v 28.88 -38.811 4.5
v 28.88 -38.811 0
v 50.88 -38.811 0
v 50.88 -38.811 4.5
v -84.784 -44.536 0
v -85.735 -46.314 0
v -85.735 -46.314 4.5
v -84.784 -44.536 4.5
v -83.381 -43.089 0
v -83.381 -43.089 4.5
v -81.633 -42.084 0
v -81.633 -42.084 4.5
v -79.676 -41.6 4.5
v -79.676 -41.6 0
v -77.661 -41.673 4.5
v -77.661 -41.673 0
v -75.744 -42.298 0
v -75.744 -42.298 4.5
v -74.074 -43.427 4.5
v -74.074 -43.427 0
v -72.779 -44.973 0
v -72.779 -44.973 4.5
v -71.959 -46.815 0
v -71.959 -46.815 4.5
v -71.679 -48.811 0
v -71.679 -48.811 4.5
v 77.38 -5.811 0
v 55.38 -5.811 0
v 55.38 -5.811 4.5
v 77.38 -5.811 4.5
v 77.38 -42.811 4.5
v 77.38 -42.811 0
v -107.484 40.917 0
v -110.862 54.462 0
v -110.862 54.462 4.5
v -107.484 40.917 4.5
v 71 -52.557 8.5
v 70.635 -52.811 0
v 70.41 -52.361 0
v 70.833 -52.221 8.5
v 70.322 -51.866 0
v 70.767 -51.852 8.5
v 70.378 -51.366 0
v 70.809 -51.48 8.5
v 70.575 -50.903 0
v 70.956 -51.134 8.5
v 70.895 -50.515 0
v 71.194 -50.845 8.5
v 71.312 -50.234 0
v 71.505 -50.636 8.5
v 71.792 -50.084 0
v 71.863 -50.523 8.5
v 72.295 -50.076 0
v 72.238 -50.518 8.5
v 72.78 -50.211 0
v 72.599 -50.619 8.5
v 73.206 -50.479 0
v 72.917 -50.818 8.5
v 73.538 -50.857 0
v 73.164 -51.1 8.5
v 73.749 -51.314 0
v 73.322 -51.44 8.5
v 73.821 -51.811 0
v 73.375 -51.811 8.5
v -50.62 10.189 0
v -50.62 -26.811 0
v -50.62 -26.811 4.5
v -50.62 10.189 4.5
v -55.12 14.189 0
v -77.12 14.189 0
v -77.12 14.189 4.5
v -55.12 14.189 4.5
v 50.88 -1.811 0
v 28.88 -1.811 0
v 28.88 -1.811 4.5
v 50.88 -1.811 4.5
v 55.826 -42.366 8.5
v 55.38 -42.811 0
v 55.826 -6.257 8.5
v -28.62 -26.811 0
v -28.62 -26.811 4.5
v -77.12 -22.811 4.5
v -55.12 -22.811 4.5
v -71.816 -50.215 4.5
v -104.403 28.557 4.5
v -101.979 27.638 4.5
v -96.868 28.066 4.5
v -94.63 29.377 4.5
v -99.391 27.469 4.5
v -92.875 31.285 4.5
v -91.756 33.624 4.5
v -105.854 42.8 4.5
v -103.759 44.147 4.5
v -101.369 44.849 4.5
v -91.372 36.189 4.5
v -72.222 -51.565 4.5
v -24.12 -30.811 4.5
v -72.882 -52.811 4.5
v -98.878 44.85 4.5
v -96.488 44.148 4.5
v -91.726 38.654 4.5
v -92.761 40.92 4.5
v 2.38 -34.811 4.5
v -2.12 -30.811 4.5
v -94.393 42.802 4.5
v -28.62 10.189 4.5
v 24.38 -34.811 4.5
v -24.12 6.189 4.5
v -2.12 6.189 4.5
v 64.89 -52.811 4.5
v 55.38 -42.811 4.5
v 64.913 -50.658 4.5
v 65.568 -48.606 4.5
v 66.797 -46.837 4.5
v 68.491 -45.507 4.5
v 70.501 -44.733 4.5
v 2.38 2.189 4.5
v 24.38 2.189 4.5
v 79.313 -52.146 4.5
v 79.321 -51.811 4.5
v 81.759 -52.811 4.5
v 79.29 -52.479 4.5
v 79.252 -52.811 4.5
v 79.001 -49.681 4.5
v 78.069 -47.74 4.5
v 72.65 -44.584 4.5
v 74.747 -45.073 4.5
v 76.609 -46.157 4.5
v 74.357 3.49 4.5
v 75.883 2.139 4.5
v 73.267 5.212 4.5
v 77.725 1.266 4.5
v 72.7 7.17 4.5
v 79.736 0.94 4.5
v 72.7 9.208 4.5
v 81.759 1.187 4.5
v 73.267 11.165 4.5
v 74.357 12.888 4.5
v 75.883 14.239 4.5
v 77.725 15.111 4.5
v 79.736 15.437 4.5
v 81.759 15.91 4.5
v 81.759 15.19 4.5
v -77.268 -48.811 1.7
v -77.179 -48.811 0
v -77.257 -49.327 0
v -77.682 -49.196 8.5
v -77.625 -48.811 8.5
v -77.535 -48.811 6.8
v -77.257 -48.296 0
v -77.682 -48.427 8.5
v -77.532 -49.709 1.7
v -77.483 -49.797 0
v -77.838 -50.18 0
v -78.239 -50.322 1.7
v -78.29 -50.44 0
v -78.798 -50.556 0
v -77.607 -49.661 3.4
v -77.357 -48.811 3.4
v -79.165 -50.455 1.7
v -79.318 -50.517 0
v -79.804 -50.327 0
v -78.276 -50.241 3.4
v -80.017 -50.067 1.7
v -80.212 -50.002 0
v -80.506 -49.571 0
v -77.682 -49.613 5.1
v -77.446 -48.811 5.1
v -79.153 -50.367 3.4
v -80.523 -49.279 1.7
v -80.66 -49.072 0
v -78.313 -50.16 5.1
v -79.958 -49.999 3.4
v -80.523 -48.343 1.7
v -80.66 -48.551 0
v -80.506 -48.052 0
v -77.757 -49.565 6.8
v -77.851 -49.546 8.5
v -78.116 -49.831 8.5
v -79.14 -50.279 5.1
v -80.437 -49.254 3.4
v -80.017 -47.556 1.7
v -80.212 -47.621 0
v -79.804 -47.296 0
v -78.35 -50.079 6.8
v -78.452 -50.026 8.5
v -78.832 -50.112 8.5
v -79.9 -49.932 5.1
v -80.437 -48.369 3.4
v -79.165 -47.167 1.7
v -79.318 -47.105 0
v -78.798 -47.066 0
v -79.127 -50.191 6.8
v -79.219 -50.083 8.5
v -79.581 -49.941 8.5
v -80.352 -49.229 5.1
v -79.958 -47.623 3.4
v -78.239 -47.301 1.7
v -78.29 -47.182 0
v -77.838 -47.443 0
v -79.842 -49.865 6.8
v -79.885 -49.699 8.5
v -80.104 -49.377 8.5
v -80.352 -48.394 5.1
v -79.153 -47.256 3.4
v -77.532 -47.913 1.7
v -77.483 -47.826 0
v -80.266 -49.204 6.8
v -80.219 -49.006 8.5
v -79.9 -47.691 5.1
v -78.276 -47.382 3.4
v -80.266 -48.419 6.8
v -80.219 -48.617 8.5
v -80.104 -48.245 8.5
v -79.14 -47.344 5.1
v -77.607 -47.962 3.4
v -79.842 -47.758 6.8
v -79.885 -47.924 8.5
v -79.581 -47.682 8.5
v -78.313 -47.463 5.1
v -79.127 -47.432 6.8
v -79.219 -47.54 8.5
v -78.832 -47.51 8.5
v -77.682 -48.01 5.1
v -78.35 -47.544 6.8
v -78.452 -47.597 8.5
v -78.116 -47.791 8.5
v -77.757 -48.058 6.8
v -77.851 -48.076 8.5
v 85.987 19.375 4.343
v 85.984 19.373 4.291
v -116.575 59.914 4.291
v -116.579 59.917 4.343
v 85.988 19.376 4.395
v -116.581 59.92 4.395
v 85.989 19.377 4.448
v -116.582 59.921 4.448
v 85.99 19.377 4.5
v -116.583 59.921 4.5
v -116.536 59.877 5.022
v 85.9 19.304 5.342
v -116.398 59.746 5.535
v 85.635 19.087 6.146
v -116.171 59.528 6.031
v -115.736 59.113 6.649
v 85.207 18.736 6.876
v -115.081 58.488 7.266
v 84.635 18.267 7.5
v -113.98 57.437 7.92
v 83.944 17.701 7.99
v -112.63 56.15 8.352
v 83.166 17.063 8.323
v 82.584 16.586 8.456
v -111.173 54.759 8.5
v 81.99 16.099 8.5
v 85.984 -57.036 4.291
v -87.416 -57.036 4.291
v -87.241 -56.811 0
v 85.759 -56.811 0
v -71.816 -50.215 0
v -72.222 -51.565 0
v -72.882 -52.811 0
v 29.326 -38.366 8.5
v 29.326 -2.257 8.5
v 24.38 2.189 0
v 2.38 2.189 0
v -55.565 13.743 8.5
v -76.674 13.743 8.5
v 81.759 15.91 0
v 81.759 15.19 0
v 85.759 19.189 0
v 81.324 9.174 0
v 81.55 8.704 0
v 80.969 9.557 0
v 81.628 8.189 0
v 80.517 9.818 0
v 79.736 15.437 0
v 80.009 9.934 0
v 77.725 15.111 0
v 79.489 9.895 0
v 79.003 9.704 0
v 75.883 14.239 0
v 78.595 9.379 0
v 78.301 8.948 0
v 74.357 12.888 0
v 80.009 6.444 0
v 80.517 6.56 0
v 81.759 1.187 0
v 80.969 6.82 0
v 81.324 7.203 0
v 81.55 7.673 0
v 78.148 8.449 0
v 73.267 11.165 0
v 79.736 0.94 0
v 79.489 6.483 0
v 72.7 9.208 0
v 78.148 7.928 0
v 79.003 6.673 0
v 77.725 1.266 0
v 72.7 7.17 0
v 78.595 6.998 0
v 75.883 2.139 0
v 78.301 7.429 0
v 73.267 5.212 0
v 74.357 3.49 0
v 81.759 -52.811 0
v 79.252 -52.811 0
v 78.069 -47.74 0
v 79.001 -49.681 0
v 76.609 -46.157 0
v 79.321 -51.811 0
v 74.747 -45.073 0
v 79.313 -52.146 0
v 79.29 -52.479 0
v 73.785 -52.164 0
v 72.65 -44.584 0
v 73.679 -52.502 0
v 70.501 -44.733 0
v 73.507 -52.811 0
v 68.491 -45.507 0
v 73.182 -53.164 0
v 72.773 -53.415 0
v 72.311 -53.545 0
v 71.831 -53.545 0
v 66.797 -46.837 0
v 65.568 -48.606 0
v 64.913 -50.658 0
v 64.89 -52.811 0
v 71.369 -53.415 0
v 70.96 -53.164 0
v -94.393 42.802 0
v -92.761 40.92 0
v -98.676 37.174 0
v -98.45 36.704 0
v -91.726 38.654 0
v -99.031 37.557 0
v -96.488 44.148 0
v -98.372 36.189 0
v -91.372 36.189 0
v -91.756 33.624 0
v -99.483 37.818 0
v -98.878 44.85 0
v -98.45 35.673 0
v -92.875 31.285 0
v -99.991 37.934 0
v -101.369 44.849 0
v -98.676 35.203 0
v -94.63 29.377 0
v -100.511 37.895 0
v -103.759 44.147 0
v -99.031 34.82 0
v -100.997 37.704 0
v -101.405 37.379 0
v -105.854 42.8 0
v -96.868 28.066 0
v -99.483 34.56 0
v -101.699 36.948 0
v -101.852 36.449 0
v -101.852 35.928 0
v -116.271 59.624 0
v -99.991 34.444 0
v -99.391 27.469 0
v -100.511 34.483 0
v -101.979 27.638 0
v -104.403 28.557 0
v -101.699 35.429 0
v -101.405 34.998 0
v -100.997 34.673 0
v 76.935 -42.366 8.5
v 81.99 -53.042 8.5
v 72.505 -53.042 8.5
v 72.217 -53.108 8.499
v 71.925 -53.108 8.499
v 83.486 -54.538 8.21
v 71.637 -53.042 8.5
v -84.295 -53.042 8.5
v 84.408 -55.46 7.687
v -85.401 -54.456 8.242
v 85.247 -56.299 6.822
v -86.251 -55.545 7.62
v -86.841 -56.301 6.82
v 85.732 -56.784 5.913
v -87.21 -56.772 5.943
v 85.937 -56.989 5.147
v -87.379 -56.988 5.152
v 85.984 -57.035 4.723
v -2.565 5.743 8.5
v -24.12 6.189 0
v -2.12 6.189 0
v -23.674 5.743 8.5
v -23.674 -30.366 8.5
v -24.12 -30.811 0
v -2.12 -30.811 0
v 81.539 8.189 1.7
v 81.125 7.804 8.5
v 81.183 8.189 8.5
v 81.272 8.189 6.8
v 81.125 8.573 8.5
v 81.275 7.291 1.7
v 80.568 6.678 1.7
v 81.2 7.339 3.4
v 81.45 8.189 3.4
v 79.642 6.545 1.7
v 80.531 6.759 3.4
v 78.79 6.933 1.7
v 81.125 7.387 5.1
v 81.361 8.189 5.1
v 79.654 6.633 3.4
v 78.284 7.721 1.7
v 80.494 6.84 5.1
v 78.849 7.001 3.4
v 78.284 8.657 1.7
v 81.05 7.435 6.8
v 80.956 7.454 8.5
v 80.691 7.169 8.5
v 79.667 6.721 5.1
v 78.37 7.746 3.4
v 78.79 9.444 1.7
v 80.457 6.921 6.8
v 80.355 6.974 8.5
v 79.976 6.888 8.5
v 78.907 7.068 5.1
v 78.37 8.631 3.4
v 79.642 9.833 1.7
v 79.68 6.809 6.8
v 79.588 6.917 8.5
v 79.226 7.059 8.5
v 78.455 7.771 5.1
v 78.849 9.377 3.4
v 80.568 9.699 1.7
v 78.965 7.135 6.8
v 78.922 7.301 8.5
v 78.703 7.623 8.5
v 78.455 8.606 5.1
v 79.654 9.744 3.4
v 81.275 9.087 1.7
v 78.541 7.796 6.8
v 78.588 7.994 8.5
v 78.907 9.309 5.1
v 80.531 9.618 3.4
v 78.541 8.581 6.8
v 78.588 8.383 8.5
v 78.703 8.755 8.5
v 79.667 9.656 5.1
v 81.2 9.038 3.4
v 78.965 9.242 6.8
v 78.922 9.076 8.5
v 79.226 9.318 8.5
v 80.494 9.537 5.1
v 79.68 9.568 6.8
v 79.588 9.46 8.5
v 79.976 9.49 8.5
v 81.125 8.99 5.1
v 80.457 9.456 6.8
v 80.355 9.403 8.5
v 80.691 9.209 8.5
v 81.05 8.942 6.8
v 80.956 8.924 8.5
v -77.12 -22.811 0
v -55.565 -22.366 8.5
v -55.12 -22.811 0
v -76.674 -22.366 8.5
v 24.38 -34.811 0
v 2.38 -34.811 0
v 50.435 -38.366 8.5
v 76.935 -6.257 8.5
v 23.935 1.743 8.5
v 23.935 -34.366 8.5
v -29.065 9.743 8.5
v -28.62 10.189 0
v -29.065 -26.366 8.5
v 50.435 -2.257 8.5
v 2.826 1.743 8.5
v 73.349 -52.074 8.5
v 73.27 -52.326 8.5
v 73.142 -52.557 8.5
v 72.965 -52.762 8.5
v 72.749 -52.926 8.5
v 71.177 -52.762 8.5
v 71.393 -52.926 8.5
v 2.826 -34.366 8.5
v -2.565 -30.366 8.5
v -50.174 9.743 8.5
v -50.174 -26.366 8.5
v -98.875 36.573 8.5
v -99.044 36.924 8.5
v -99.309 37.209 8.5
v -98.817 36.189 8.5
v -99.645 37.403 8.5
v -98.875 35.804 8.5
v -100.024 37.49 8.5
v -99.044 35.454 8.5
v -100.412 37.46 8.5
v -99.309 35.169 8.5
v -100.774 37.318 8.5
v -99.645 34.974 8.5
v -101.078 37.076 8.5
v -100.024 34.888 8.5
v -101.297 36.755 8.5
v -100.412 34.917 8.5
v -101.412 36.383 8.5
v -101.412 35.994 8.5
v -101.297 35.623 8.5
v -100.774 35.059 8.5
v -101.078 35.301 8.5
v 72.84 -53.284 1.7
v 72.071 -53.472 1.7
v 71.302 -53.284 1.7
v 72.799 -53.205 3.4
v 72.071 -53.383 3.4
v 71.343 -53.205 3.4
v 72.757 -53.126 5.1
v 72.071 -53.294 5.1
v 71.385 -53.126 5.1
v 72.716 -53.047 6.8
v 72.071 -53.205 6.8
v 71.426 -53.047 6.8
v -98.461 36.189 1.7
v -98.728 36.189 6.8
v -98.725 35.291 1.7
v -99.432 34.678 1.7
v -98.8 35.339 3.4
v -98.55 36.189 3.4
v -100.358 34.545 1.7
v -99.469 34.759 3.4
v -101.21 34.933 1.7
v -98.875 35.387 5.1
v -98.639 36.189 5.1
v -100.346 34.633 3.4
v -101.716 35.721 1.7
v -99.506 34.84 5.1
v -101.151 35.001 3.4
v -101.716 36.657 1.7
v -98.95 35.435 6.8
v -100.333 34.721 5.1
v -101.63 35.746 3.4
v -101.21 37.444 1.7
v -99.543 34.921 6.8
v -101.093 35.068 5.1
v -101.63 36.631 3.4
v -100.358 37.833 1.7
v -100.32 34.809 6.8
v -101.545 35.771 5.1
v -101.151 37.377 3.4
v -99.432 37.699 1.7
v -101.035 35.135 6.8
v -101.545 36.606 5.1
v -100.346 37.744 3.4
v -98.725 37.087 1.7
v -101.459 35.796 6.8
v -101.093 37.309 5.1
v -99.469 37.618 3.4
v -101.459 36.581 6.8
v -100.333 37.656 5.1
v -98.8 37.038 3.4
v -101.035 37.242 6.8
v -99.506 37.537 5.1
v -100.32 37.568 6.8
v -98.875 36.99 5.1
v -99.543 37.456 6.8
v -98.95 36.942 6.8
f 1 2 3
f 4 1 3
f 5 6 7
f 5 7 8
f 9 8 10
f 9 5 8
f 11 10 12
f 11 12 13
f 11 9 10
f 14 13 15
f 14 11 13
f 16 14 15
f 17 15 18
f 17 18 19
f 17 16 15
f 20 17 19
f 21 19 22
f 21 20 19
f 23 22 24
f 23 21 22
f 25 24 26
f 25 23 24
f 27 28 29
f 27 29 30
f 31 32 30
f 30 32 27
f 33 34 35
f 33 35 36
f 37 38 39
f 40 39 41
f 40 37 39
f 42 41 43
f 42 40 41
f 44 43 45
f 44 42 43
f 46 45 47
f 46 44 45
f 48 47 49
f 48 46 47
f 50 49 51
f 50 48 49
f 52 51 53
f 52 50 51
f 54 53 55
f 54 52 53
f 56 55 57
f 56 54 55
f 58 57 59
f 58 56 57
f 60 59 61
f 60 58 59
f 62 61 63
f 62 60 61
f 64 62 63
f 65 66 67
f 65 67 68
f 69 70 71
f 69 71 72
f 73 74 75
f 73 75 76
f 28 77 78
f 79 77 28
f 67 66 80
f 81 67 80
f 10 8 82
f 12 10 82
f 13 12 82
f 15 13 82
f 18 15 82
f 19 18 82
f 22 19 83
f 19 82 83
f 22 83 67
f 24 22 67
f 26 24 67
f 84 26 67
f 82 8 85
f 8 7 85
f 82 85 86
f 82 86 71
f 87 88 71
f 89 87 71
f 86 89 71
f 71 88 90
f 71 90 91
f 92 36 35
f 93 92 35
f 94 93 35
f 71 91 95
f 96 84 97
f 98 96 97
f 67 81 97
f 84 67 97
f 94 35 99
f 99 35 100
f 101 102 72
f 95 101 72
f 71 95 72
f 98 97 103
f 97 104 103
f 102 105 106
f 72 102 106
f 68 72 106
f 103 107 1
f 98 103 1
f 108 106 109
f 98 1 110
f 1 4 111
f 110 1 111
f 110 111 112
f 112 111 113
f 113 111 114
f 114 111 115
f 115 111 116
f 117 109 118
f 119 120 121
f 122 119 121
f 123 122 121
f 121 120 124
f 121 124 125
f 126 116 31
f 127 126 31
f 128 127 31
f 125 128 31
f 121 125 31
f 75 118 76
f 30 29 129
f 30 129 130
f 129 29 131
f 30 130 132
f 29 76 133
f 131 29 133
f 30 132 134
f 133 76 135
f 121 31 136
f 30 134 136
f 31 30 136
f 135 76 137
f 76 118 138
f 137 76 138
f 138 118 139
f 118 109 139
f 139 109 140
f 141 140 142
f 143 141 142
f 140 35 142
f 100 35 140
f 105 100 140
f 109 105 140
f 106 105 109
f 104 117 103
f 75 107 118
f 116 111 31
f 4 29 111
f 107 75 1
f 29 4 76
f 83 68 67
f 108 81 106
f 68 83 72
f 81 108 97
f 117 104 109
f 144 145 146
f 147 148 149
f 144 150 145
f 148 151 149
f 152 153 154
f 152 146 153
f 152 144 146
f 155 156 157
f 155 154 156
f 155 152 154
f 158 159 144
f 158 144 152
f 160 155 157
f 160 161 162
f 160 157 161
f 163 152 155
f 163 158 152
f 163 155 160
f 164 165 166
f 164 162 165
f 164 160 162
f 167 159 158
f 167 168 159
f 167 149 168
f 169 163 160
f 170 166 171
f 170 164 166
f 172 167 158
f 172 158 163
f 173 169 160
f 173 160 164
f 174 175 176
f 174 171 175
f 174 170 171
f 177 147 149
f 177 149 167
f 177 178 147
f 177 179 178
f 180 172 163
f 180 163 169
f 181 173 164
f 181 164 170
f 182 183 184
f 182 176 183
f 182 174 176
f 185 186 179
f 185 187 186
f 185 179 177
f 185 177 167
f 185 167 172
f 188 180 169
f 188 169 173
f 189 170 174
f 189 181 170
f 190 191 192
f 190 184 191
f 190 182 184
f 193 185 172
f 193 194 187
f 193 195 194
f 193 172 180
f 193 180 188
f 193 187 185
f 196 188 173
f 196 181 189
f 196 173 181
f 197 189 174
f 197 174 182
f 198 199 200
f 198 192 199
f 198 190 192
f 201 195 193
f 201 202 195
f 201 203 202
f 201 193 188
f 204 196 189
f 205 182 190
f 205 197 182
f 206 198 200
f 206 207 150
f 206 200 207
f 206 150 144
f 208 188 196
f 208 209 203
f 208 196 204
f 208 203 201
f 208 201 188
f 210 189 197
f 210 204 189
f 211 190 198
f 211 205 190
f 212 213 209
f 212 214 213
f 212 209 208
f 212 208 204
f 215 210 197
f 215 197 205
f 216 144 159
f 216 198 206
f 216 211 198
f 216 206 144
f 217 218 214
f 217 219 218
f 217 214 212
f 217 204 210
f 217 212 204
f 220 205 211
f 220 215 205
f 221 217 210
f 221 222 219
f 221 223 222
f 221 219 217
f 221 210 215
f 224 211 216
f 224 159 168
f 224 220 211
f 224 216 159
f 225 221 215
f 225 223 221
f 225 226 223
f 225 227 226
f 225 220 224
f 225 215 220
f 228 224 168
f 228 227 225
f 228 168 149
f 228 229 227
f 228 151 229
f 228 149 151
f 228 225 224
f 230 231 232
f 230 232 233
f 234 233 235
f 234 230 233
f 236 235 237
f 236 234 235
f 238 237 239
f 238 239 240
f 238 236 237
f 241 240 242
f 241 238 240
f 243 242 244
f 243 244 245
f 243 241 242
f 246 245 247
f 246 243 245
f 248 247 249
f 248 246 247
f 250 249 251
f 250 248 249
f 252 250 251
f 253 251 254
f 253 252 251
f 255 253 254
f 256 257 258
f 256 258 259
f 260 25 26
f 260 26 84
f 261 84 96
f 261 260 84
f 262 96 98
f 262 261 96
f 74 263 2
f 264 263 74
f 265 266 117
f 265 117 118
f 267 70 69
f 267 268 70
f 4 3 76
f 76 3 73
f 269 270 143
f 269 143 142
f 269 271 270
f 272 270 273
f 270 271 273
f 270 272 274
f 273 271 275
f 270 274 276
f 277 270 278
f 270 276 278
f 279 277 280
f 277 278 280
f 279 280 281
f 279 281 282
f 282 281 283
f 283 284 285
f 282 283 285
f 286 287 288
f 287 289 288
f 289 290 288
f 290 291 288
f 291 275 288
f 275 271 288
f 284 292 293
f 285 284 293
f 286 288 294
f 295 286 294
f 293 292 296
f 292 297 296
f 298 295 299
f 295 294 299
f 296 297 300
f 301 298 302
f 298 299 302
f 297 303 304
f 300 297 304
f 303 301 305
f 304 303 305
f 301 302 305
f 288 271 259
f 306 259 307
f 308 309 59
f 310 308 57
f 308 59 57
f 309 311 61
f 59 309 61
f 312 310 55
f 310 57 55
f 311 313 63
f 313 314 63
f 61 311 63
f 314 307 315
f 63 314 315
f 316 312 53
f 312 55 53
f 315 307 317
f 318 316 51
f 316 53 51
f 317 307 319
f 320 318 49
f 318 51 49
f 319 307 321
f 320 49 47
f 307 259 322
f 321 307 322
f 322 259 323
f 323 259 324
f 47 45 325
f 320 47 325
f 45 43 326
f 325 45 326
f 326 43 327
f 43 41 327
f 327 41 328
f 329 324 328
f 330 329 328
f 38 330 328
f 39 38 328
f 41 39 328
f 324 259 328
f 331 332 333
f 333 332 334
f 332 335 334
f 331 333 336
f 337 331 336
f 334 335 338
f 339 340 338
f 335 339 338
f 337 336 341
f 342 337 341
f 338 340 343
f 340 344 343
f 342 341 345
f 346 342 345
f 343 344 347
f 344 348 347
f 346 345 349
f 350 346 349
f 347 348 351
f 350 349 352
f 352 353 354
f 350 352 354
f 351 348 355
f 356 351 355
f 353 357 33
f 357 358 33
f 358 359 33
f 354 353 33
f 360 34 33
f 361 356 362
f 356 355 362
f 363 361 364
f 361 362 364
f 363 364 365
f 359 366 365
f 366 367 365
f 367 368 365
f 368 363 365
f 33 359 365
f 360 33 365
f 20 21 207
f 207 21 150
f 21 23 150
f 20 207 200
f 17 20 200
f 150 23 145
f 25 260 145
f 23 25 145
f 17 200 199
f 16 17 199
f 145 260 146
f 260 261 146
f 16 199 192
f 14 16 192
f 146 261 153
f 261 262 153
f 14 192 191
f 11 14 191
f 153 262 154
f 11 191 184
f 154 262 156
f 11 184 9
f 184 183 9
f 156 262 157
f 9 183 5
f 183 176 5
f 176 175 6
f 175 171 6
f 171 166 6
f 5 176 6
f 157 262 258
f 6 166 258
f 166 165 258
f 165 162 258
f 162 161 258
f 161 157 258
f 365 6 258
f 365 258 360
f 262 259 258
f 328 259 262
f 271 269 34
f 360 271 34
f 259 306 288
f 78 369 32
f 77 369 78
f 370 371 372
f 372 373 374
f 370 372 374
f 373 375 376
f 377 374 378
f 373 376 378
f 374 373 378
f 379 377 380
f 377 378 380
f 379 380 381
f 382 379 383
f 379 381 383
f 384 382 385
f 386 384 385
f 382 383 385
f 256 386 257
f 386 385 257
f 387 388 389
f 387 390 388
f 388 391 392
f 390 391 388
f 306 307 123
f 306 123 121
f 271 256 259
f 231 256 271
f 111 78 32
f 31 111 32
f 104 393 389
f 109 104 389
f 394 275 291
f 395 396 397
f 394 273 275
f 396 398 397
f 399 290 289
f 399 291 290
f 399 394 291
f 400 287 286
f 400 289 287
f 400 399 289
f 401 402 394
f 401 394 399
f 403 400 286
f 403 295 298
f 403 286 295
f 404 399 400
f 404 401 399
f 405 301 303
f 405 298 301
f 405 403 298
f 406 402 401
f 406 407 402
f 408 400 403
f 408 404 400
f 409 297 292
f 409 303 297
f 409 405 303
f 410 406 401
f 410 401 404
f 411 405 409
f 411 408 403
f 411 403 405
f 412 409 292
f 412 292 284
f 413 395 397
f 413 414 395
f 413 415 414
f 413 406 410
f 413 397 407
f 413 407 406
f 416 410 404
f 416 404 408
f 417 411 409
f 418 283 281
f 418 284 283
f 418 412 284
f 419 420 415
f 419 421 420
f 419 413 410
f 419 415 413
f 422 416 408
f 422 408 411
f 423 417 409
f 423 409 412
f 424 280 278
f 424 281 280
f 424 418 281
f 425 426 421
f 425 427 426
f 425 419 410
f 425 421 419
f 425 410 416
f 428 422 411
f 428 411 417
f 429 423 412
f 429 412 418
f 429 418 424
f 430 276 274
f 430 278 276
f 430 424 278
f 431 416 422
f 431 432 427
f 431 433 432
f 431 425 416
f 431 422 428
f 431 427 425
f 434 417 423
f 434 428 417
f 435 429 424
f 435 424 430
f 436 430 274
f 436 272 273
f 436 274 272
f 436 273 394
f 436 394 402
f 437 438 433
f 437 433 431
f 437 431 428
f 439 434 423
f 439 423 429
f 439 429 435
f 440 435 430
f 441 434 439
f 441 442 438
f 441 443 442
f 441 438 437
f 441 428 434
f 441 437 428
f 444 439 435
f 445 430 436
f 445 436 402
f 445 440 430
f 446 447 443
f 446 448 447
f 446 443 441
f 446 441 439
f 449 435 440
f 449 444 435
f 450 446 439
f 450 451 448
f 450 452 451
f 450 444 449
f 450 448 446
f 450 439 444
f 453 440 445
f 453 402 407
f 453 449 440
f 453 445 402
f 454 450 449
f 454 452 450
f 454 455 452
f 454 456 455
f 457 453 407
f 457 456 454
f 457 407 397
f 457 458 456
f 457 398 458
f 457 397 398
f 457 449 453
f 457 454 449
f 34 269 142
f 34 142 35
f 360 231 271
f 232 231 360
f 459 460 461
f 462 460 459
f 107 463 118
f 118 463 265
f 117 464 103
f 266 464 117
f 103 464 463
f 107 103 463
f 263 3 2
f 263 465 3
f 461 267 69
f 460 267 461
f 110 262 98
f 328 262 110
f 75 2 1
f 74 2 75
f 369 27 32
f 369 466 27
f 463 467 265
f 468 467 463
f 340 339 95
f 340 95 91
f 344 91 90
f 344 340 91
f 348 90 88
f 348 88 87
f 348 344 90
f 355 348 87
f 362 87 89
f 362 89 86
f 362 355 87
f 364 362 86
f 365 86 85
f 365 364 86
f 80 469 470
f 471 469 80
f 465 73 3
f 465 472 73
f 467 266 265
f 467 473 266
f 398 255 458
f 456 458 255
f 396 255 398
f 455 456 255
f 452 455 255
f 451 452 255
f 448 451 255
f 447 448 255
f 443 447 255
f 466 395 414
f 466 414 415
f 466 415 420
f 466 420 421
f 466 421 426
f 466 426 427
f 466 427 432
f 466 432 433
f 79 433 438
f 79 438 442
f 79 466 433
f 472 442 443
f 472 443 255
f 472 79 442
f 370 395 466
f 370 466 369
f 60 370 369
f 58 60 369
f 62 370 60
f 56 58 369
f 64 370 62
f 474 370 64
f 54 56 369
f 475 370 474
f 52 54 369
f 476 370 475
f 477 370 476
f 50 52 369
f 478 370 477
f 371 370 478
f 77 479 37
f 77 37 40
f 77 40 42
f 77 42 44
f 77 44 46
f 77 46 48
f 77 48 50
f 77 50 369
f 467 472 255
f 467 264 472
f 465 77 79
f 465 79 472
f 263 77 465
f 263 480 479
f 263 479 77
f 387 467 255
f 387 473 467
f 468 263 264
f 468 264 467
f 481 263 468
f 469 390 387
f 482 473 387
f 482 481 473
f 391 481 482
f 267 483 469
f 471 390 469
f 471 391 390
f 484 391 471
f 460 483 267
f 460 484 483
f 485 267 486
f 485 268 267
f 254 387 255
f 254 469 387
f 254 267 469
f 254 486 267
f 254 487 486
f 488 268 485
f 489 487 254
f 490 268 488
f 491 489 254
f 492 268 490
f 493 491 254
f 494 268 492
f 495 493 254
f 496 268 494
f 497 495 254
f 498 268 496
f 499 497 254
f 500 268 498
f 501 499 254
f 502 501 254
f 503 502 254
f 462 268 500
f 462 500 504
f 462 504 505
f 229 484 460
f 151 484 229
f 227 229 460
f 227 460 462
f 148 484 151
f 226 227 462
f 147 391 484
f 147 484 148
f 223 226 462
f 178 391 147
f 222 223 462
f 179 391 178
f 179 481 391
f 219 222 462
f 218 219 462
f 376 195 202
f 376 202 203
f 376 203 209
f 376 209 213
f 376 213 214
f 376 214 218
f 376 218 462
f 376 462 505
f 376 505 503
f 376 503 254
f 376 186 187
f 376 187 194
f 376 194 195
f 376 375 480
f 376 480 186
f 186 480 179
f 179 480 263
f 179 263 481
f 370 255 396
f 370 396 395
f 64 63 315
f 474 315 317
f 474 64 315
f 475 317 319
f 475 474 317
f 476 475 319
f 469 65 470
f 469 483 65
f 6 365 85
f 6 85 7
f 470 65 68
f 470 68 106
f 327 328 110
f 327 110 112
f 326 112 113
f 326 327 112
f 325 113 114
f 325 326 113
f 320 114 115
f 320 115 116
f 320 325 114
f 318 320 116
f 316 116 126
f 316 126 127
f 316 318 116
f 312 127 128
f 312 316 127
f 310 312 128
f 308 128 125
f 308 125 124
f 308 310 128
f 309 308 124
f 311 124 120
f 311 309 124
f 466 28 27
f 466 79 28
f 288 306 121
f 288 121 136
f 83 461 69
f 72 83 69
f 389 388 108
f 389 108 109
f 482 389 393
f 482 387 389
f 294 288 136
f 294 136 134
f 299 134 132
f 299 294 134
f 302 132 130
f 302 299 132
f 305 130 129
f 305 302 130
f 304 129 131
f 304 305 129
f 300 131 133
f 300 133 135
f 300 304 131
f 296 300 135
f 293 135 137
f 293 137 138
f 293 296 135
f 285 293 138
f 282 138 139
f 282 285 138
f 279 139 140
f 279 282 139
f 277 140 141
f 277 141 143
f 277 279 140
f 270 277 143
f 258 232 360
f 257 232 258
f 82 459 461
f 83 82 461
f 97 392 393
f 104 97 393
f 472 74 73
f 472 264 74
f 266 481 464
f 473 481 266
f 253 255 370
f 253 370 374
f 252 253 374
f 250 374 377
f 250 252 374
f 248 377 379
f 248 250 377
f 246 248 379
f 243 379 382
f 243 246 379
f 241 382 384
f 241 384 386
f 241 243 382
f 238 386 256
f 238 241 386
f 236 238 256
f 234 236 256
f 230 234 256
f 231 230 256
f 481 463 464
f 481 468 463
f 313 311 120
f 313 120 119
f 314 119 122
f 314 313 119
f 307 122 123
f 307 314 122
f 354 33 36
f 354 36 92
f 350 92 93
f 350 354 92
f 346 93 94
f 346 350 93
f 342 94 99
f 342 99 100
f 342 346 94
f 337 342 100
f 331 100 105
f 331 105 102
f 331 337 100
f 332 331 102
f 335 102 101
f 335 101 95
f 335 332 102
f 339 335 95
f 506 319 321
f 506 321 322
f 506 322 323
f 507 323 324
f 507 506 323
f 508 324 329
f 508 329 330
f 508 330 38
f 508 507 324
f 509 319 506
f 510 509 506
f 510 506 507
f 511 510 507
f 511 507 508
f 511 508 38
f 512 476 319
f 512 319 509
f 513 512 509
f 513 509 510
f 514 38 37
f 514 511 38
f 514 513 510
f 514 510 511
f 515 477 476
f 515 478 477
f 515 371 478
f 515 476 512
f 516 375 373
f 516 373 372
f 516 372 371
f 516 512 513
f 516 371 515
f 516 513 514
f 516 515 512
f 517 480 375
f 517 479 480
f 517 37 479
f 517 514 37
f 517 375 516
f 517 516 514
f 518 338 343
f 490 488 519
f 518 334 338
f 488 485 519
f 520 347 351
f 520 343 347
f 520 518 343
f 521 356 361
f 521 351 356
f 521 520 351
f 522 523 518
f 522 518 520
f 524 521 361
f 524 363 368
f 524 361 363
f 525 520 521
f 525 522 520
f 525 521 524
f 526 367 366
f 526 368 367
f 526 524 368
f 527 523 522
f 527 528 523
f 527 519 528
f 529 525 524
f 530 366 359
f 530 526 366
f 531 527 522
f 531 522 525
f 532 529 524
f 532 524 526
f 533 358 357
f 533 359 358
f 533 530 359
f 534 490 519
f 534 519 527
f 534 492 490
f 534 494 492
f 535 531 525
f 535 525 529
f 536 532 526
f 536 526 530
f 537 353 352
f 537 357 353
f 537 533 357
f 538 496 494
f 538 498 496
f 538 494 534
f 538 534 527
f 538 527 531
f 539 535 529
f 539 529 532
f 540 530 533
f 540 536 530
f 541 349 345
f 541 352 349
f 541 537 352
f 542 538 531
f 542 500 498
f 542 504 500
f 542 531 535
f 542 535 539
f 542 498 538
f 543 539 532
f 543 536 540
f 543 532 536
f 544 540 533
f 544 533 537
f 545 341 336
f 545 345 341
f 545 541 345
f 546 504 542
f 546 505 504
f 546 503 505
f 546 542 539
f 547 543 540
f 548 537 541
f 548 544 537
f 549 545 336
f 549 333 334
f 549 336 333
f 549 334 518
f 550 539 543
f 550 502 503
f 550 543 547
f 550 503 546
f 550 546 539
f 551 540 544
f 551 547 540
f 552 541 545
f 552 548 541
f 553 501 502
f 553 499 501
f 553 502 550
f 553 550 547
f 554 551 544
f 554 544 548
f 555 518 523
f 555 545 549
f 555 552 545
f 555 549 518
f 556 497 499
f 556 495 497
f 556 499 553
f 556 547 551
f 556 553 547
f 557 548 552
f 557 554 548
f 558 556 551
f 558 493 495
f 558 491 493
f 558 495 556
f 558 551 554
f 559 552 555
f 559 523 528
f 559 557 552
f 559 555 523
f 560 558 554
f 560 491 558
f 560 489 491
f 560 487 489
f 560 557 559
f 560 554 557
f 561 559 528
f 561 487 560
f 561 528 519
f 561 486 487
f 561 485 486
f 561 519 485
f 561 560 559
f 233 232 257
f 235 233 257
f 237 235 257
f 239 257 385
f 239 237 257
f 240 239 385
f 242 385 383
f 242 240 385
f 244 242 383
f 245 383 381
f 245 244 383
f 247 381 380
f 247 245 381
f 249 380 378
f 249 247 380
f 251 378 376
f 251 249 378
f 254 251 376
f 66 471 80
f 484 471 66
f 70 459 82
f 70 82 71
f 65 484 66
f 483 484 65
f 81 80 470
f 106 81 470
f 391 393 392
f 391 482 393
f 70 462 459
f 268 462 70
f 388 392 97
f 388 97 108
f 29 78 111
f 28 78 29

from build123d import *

# Parameters (mm, degrees)
F0_R        = 1.75
F0_W        = 22
F0_H        = 37
F1_DEPTH    = 8.5
F1_TAPER    = -3
F2_DEPTH    = 4.5
F3_T1_DEPTH = 142.1271805444
F3_T3_DEPTH = 228.1816697632
F3_T5_DEPTH = 194.8691049092
F3_T7_DEPTH = 97.8862114568


# Not quite as in the source:
# - a fillet or chamfer that OpenCascade refuses, or shapes differently, is made with other operations: its cross-section is extruded or revolved along the edge and cut away or added


with BuildPart() as f1:
    # F0 (on Top) → F1 (new body)
    with BuildSketch(Plane.XY):
        with BuildLine():
            ThreePointArc((-85.7353818111, -46.3140564233), (-82.1998275149, -55.281625252), (-72.882363358, -52.811342563))
            Line((-72.882363358, -52.811342563), (-84.115426434, -52.811342563))
            Line((-84.115426434, -52.811342563), (-85.7353818111, -46.3140564233))
        make_face()
        with BuildLine():
            Line((-84.115426434, -52.811342563), (-72.882363358, -52.811342563))
            ThreePointArc((-72.882363358, -52.811342563), (-71.9863977223, -50.8998795502), (-71.6790566692, -48.811342563))
            ThreePointArc((-71.6790566692, -48.811342563), (-77.6608605642, -41.6731229923), (-85.7353818111, -46.3140564233))
            Line((-85.7353818111, -46.3140564233), (-84.115426434, -52.811342563))
        make_face()
        with Locations((-78.9290566692, -48.811342563)):
            Circle(F0_R, mode=Mode.SUBTRACT)
        with BuildLine():
            ThreePointArc((73.5070839924, -52.811342563), (72.0709433308, -53.561342563), (70.6348026691, -52.811342563))
            Line((70.6348026691, -52.811342563), (64.8902400226, -52.811342563))
            ThreePointArc((64.8902400226, -52.811342563), (65.5417323383, -54.9628348787), (66.8209433308, -56.811342563))
            Line((66.8209433308, -56.811342563), (77.3209433308, -56.811342563))
            ThreePointArc((77.3209433308, -56.811342563), (78.6001543232, -54.9628348787), (79.2516466389, -52.811342563))
            Line((79.2516466389, -52.811342563), (73.5070839924, -52.811342563))
        make_face()
        with BuildLine():
            ThreePointArc((70.6348026691, -52.811342563), (71.5468947442, -50.1416500527), (73.8209433308, -51.811342563))
            ThreePointArc((73.8209433308, -51.811342563), (73.7406358411, -52.3353911496), (73.5070839924, -52.811342563))
            Line((73.5070839924, -52.811342563), (79.2516466389, -52.811342563))
            ThreePointArc((79.2516466389, -52.811342563), (79.3035984098, -52.3125416331), (79.3209433308, -51.811342563))
            ThreePointArc((79.3209433308, -51.811342563), (71.5697442607, -44.578687484), (64.8902400226, -52.811342563))
            Line((64.8902400226, -52.811342563), (70.6348026691, -52.811342563))
        make_face()
        with BuildLine():
            ThreePointArc((81.75943106, 15.1902968563), (72.6280630891, 8.188657437), (81.75943106, 1.1870180177))
            Line((81.75943106, 1.1870180177), (81.75943106, 15.1902968563))
        make_face()
        with Locations((79.8780630891, 8.188657437)):
            Circle(F0_R, mode=Mode.SUBTRACT)
        with BuildLine():
            Line((81.75943106, 15.1902968563), (81.75943106, 1.1870180177))
            ThreePointArc((81.75943106, 1.1870180177), (83.9978435057, 2.2229295418), (85.75943106, 3.9493165931))
            Line((85.75943106, 3.9493165931), (85.75943106, 12.4279982809))
            ThreePointArc((85.75943106, 12.4279982809), (83.9978435057, 14.1543853322), (81.75943106, 15.1902968563))
        make_face()
        with BuildLine():
            Line((-107.4844802754, 40.9168130189), (-104.4029422618, 28.5574391079))
            ThreePointArc((-104.4029422618, 28.5574391079), (-95.700189339, 28.6381178265), (-91.3719369109, 36.188657437))
            ThreePointArc((-91.3719369109, 36.188657437), (-97.6581749945, 44.5846313066), (-107.4844802754, 40.9168130189))
        make_face()
        with Locations((-100.1219369109, 36.188657437)):
            Circle(F0_R, mode=Mode.SUBTRACT)
        with BuildLine():
            ThreePointArc((-107.4844802754, 40.9168130189), (-108.6120245158, 34.0718408505), (-104.4029422618, 28.5574391079))
            Line((-104.4029422618, 28.5574391079), (-107.4844802754, 40.9168130189))
        make_face()
        with BuildLine():
            ThreePointArc((66.8209433308, -56.811342563), (65.5417323383, -54.9628348787), (64.8902400226, -52.811342563))
            Line((64.8902400226, -52.811342563), (-72.882363358, -52.811342563))
            ThreePointArc((-72.882363358, -52.811342563), (-82.1998275149, -55.281625252), (-85.7353818111, -46.3140564233))
            Line((-85.7353818111, -46.3140564233), (-104.4029422618, 28.5574391079))
            ThreePointArc((-104.4029422618, 28.5574391079), (-108.6120245158, 34.0718408505), (-107.4844802754, 40.9168130189))
            Line((-107.4844802754, 40.9168130189), (-110.8617073408, 54.4621309411))
            Line((-110.8617073408, 54.4621309411), (81.75943106, 15.9099091088))
            Line((81.75943106, 15.9099091088), (81.75943106, 15.1902968563))
            ThreePointArc((81.75943106, 15.1902968563), (83.9978435057, 14.1543853322), (85.75943106, 12.4279982809))
            Line((85.75943106, 12.4279982809), (85.75943106, 19.188657437))
            Line((85.75943106, 19.188657437), (-116.2711964119, 59.6241445901))
            Line((-116.2711964119, 59.6241445901), (-87.24056894, -56.811342563))
            Line((-87.24056894, -56.811342563), (66.8209433308, -56.811342563))
        make_face()
        with BuildLine():
            Line((81.75943106, -52.811342563), (79.2516466389, -52.811342563))
            ThreePointArc((79.2516466389, -52.811342563), (78.6001543232, -54.9628348787), (77.3209433308, -56.811342563))
            Line((77.3209433308, -56.811342563), (85.75943106, -56.811342563))
            Line((85.75943106, -56.811342563), (85.75943106, 3.9493165931))
            ThreePointArc((85.75943106, 3.9493165931), (83.9978435057, 2.2229295418), (81.75943106, 1.1870180177))
            Line((81.75943106, 1.1870180177), (81.75943106, -52.811342563))
        make_face()
        with BuildLine():
            Line((-72.882363358, -52.811342563), (64.8902400226, -52.811342563))
            ThreePointArc((64.8902400226, -52.811342563), (71.5697442607, -44.578687484), (79.3209433308, -51.811342563))
            ThreePointArc((79.3209433308, -51.811342563), (79.3035984098, -52.3125416331), (79.2516466389, -52.811342563))
            Line((79.2516466389, -52.811342563), (81.75943106, -52.811342563))
            Line((81.75943106, -52.811342563), (81.75943106, 1.1870180177))
            ThreePointArc((81.75943106, 1.1870180177), (72.6280630891, 8.188657437), (81.75943106, 15.1902968563))
            Line((81.75943106, 15.1902968563), (81.75943106, 15.9099091088))
            Line((81.75943106, 15.9099091088), (-110.8617073408, 54.4621309411))
            Line((-110.8617073408, 54.4621309411), (-107.4844802754, 40.9168130189))
            ThreePointArc((-107.4844802754, 40.9168130189), (-97.6581749945, 44.5846313066), (-91.3719369109, 36.188657437))
            ThreePointArc((-91.3719369109, 36.188657437), (-95.700189339, 28.6381178265), (-104.4029422618, 28.5574391079))
            Line((-104.4029422618, 28.5574391079), (-85.7353818111, -46.3140564233))
            ThreePointArc((-85.7353818111, -46.3140564233), (-77.6608605642, -41.6731229923), (-71.6790566692, -48.811342563))
            ThreePointArc((-71.6790566692, -48.811342563), (-71.9863977223, -50.8998795502), (-72.882363358, -52.811342563))
        make_face()
        with Locations((-66.1195590496, -4.311342563)):
            Rectangle(F0_W, F0_H, mode=Mode.SUBTRACT)
        with Locations((-39.6195590496, -8.311342563)):
            Rectangle(F0_W, F0_H, mode=Mode.SUBTRACT)
        with Locations((13.3804409504, -16.311342563)):
            Rectangle(F0_W, F0_H, mode=Mode.SUBTRACT)
        with Locations((-13.1195590496, -12.311342563)):
            Rectangle(F0_W, F0_H, mode=Mode.SUBTRACT)
        with Locations((39.8804409504, -20.311342563)):
            Rectangle(F0_W, F0_H, mode=Mode.SUBTRACT)
        with Locations((66.3804409504, -24.311342563)):
            Rectangle(F0_W, F0_H, mode=Mode.SUBTRACT)
    extrude(amount=F1_DEPTH, taper=F1_TAPER)

    # F0 (on Top) → F2 (cut)
    with BuildSketch(Plane.XY):
        with BuildLine():
            Line((-72.882363358, -52.811342563), (64.8902400226, -52.811342563))
            ThreePointArc((64.8902400226, -52.811342563), (71.5697442607, -44.578687484), (79.3209433308, -51.811342563))
            ThreePointArc((79.3209433308, -51.811342563), (79.3035984098, -52.3125416331), (79.2516466389, -52.811342563))
            Line((79.2516466389, -52.811342563), (81.75943106, -52.811342563))
            Line((81.75943106, -52.811342563), (81.75943106, 1.1870180177))
            ThreePointArc((81.75943106, 1.1870180177), (72.6280630891, 8.188657437), (81.75943106, 15.1902968563))
            Line((81.75943106, 15.1902968563), (81.75943106, 15.9099091088))
            Line((81.75943106, 15.9099091088), (-110.8617073408, 54.4621309411))
            Line((-110.8617073408, 54.4621309411), (-107.4844802754, 40.9168130189))
            ThreePointArc((-107.4844802754, 40.9168130189), (-97.6581749945, 44.5846313066), (-91.3719369109, 36.188657437))
            ThreePointArc((-91.3719369109, 36.188657437), (-95.700189339, 28.6381178265), (-104.4029422618, 28.5574391079))
            Line((-104.4029422618, 28.5574391079), (-85.7353818111, -46.3140564233))
            ThreePointArc((-85.7353818111, -46.3140564233), (-77.6608605642, -41.6731229923), (-71.6790566692, -48.811342563))
            ThreePointArc((-71.6790566692, -48.811342563), (-71.9863977223, -50.8998795502), (-72.882363358, -52.811342563))
        make_face()
        with Locations((-66.1195590496, -4.311342563)):
            Rectangle(F0_W, F0_H, mode=Mode.SUBTRACT)
        with Locations((-39.6195590496, -8.311342563)):
            Rectangle(F0_W, F0_H, mode=Mode.SUBTRACT)
        with Locations((13.3804409504, -16.311342563)):
            Rectangle(F0_W, F0_H, mode=Mode.SUBTRACT)
        with Locations((-13.1195590496, -12.311342563)):
            Rectangle(F0_W, F0_H, mode=Mode.SUBTRACT)
        with Locations((39.8804409504, -20.311342563)):
            Rectangle(F0_W, F0_H, mode=Mode.SUBTRACT)
        with Locations((66.3804409504, -24.311342563)):
            Rectangle(F0_W, F0_H, mode=Mode.SUBTRACT)
    extrude(amount=F2_DEPTH, mode=Mode.SUBTRACT)

    # F3: fillet of radius 4 on 4 edges, made by hand

    # F3_s2 → F3_t1 (cut)
    with BuildSketch(Plane(origin=(-23.5203588914, 94.3350069914, 0), x_dir=(0, 0, 1), z_dir=(0.2419218956, -0.9702957263, 0))):
        with BuildLine():
            ThreePointArc((4.290656175, 98.6179226466), (7.2534183028, 97.5249019916), (8.5, 94.6234045075))
            Line((8.5, 94.6234045075), (8.5, 98.8385250087))
            Line((8.5, 98.8385250087), (4.290656175, 98.6179226466))
        make_face()
    extrude(amount=F3_T1_DEPTH, mode=Mode.SUBTRACT)

    # F3_s4 → F3_t3 (cut)
    with BuildSketch(Plane(origin=(89.4546965917, -17.9039400119, 0), x_dir=(0, 0, 1), z_dir=(-0.980553261, 0.1962531587, 0))):
        with BuildLine():
            ThreePointArc((4.290656175, 35.8709236176), (7.2534183028, 34.7779029626), (8.5, 31.8764054785))
            Line((8.5, 31.8764054785), (8.5, 36.0915259797))
            Line((8.5, 36.0915259797), (4.290656175, 35.8709236176))
        make_face()
    extrude(amount=F3_T3_DEPTH, mode=Mode.SUBTRACT)

    # F3_s6 → F3_t5 (cut)
    with BuildSketch(Plane.YZ.offset(-98.1264064725)):
        with BuildLine():
            ThreePointArc((-53.0416881858, 8.5), (-55.9431856699, 7.2534183028), (-57.0362063248, 4.290656175))
            Line((-57.0362063248, 4.290656175), (-57.2568086869, 8.5))
            Line((-57.2568086869, 8.5), (-53.0416881858, 8.5))
        make_face()
    extrude(amount=F3_T5_DEPTH, mode=Mode.SUBTRACT)

    # F3_s8 → F3_t7 (cut)
    with BuildSketch(Plane.XZ.offset(-30.091601517)):
        with BuildLine():
            ThreePointArc((81.9897766828, 8.5), (84.8912741668, 7.2534183028), (85.9842948218, 4.290656175))
            Line((85.9842948218, 4.290656175), (86.2048971839, 8.5))
            Line((86.2048971839, 8.5), (81.9897766828, 8.5))
        make_face()
    extrude(amount=F3_T7_DEPTH, mode=Mode.SUBTRACT)


solid = f1.part
